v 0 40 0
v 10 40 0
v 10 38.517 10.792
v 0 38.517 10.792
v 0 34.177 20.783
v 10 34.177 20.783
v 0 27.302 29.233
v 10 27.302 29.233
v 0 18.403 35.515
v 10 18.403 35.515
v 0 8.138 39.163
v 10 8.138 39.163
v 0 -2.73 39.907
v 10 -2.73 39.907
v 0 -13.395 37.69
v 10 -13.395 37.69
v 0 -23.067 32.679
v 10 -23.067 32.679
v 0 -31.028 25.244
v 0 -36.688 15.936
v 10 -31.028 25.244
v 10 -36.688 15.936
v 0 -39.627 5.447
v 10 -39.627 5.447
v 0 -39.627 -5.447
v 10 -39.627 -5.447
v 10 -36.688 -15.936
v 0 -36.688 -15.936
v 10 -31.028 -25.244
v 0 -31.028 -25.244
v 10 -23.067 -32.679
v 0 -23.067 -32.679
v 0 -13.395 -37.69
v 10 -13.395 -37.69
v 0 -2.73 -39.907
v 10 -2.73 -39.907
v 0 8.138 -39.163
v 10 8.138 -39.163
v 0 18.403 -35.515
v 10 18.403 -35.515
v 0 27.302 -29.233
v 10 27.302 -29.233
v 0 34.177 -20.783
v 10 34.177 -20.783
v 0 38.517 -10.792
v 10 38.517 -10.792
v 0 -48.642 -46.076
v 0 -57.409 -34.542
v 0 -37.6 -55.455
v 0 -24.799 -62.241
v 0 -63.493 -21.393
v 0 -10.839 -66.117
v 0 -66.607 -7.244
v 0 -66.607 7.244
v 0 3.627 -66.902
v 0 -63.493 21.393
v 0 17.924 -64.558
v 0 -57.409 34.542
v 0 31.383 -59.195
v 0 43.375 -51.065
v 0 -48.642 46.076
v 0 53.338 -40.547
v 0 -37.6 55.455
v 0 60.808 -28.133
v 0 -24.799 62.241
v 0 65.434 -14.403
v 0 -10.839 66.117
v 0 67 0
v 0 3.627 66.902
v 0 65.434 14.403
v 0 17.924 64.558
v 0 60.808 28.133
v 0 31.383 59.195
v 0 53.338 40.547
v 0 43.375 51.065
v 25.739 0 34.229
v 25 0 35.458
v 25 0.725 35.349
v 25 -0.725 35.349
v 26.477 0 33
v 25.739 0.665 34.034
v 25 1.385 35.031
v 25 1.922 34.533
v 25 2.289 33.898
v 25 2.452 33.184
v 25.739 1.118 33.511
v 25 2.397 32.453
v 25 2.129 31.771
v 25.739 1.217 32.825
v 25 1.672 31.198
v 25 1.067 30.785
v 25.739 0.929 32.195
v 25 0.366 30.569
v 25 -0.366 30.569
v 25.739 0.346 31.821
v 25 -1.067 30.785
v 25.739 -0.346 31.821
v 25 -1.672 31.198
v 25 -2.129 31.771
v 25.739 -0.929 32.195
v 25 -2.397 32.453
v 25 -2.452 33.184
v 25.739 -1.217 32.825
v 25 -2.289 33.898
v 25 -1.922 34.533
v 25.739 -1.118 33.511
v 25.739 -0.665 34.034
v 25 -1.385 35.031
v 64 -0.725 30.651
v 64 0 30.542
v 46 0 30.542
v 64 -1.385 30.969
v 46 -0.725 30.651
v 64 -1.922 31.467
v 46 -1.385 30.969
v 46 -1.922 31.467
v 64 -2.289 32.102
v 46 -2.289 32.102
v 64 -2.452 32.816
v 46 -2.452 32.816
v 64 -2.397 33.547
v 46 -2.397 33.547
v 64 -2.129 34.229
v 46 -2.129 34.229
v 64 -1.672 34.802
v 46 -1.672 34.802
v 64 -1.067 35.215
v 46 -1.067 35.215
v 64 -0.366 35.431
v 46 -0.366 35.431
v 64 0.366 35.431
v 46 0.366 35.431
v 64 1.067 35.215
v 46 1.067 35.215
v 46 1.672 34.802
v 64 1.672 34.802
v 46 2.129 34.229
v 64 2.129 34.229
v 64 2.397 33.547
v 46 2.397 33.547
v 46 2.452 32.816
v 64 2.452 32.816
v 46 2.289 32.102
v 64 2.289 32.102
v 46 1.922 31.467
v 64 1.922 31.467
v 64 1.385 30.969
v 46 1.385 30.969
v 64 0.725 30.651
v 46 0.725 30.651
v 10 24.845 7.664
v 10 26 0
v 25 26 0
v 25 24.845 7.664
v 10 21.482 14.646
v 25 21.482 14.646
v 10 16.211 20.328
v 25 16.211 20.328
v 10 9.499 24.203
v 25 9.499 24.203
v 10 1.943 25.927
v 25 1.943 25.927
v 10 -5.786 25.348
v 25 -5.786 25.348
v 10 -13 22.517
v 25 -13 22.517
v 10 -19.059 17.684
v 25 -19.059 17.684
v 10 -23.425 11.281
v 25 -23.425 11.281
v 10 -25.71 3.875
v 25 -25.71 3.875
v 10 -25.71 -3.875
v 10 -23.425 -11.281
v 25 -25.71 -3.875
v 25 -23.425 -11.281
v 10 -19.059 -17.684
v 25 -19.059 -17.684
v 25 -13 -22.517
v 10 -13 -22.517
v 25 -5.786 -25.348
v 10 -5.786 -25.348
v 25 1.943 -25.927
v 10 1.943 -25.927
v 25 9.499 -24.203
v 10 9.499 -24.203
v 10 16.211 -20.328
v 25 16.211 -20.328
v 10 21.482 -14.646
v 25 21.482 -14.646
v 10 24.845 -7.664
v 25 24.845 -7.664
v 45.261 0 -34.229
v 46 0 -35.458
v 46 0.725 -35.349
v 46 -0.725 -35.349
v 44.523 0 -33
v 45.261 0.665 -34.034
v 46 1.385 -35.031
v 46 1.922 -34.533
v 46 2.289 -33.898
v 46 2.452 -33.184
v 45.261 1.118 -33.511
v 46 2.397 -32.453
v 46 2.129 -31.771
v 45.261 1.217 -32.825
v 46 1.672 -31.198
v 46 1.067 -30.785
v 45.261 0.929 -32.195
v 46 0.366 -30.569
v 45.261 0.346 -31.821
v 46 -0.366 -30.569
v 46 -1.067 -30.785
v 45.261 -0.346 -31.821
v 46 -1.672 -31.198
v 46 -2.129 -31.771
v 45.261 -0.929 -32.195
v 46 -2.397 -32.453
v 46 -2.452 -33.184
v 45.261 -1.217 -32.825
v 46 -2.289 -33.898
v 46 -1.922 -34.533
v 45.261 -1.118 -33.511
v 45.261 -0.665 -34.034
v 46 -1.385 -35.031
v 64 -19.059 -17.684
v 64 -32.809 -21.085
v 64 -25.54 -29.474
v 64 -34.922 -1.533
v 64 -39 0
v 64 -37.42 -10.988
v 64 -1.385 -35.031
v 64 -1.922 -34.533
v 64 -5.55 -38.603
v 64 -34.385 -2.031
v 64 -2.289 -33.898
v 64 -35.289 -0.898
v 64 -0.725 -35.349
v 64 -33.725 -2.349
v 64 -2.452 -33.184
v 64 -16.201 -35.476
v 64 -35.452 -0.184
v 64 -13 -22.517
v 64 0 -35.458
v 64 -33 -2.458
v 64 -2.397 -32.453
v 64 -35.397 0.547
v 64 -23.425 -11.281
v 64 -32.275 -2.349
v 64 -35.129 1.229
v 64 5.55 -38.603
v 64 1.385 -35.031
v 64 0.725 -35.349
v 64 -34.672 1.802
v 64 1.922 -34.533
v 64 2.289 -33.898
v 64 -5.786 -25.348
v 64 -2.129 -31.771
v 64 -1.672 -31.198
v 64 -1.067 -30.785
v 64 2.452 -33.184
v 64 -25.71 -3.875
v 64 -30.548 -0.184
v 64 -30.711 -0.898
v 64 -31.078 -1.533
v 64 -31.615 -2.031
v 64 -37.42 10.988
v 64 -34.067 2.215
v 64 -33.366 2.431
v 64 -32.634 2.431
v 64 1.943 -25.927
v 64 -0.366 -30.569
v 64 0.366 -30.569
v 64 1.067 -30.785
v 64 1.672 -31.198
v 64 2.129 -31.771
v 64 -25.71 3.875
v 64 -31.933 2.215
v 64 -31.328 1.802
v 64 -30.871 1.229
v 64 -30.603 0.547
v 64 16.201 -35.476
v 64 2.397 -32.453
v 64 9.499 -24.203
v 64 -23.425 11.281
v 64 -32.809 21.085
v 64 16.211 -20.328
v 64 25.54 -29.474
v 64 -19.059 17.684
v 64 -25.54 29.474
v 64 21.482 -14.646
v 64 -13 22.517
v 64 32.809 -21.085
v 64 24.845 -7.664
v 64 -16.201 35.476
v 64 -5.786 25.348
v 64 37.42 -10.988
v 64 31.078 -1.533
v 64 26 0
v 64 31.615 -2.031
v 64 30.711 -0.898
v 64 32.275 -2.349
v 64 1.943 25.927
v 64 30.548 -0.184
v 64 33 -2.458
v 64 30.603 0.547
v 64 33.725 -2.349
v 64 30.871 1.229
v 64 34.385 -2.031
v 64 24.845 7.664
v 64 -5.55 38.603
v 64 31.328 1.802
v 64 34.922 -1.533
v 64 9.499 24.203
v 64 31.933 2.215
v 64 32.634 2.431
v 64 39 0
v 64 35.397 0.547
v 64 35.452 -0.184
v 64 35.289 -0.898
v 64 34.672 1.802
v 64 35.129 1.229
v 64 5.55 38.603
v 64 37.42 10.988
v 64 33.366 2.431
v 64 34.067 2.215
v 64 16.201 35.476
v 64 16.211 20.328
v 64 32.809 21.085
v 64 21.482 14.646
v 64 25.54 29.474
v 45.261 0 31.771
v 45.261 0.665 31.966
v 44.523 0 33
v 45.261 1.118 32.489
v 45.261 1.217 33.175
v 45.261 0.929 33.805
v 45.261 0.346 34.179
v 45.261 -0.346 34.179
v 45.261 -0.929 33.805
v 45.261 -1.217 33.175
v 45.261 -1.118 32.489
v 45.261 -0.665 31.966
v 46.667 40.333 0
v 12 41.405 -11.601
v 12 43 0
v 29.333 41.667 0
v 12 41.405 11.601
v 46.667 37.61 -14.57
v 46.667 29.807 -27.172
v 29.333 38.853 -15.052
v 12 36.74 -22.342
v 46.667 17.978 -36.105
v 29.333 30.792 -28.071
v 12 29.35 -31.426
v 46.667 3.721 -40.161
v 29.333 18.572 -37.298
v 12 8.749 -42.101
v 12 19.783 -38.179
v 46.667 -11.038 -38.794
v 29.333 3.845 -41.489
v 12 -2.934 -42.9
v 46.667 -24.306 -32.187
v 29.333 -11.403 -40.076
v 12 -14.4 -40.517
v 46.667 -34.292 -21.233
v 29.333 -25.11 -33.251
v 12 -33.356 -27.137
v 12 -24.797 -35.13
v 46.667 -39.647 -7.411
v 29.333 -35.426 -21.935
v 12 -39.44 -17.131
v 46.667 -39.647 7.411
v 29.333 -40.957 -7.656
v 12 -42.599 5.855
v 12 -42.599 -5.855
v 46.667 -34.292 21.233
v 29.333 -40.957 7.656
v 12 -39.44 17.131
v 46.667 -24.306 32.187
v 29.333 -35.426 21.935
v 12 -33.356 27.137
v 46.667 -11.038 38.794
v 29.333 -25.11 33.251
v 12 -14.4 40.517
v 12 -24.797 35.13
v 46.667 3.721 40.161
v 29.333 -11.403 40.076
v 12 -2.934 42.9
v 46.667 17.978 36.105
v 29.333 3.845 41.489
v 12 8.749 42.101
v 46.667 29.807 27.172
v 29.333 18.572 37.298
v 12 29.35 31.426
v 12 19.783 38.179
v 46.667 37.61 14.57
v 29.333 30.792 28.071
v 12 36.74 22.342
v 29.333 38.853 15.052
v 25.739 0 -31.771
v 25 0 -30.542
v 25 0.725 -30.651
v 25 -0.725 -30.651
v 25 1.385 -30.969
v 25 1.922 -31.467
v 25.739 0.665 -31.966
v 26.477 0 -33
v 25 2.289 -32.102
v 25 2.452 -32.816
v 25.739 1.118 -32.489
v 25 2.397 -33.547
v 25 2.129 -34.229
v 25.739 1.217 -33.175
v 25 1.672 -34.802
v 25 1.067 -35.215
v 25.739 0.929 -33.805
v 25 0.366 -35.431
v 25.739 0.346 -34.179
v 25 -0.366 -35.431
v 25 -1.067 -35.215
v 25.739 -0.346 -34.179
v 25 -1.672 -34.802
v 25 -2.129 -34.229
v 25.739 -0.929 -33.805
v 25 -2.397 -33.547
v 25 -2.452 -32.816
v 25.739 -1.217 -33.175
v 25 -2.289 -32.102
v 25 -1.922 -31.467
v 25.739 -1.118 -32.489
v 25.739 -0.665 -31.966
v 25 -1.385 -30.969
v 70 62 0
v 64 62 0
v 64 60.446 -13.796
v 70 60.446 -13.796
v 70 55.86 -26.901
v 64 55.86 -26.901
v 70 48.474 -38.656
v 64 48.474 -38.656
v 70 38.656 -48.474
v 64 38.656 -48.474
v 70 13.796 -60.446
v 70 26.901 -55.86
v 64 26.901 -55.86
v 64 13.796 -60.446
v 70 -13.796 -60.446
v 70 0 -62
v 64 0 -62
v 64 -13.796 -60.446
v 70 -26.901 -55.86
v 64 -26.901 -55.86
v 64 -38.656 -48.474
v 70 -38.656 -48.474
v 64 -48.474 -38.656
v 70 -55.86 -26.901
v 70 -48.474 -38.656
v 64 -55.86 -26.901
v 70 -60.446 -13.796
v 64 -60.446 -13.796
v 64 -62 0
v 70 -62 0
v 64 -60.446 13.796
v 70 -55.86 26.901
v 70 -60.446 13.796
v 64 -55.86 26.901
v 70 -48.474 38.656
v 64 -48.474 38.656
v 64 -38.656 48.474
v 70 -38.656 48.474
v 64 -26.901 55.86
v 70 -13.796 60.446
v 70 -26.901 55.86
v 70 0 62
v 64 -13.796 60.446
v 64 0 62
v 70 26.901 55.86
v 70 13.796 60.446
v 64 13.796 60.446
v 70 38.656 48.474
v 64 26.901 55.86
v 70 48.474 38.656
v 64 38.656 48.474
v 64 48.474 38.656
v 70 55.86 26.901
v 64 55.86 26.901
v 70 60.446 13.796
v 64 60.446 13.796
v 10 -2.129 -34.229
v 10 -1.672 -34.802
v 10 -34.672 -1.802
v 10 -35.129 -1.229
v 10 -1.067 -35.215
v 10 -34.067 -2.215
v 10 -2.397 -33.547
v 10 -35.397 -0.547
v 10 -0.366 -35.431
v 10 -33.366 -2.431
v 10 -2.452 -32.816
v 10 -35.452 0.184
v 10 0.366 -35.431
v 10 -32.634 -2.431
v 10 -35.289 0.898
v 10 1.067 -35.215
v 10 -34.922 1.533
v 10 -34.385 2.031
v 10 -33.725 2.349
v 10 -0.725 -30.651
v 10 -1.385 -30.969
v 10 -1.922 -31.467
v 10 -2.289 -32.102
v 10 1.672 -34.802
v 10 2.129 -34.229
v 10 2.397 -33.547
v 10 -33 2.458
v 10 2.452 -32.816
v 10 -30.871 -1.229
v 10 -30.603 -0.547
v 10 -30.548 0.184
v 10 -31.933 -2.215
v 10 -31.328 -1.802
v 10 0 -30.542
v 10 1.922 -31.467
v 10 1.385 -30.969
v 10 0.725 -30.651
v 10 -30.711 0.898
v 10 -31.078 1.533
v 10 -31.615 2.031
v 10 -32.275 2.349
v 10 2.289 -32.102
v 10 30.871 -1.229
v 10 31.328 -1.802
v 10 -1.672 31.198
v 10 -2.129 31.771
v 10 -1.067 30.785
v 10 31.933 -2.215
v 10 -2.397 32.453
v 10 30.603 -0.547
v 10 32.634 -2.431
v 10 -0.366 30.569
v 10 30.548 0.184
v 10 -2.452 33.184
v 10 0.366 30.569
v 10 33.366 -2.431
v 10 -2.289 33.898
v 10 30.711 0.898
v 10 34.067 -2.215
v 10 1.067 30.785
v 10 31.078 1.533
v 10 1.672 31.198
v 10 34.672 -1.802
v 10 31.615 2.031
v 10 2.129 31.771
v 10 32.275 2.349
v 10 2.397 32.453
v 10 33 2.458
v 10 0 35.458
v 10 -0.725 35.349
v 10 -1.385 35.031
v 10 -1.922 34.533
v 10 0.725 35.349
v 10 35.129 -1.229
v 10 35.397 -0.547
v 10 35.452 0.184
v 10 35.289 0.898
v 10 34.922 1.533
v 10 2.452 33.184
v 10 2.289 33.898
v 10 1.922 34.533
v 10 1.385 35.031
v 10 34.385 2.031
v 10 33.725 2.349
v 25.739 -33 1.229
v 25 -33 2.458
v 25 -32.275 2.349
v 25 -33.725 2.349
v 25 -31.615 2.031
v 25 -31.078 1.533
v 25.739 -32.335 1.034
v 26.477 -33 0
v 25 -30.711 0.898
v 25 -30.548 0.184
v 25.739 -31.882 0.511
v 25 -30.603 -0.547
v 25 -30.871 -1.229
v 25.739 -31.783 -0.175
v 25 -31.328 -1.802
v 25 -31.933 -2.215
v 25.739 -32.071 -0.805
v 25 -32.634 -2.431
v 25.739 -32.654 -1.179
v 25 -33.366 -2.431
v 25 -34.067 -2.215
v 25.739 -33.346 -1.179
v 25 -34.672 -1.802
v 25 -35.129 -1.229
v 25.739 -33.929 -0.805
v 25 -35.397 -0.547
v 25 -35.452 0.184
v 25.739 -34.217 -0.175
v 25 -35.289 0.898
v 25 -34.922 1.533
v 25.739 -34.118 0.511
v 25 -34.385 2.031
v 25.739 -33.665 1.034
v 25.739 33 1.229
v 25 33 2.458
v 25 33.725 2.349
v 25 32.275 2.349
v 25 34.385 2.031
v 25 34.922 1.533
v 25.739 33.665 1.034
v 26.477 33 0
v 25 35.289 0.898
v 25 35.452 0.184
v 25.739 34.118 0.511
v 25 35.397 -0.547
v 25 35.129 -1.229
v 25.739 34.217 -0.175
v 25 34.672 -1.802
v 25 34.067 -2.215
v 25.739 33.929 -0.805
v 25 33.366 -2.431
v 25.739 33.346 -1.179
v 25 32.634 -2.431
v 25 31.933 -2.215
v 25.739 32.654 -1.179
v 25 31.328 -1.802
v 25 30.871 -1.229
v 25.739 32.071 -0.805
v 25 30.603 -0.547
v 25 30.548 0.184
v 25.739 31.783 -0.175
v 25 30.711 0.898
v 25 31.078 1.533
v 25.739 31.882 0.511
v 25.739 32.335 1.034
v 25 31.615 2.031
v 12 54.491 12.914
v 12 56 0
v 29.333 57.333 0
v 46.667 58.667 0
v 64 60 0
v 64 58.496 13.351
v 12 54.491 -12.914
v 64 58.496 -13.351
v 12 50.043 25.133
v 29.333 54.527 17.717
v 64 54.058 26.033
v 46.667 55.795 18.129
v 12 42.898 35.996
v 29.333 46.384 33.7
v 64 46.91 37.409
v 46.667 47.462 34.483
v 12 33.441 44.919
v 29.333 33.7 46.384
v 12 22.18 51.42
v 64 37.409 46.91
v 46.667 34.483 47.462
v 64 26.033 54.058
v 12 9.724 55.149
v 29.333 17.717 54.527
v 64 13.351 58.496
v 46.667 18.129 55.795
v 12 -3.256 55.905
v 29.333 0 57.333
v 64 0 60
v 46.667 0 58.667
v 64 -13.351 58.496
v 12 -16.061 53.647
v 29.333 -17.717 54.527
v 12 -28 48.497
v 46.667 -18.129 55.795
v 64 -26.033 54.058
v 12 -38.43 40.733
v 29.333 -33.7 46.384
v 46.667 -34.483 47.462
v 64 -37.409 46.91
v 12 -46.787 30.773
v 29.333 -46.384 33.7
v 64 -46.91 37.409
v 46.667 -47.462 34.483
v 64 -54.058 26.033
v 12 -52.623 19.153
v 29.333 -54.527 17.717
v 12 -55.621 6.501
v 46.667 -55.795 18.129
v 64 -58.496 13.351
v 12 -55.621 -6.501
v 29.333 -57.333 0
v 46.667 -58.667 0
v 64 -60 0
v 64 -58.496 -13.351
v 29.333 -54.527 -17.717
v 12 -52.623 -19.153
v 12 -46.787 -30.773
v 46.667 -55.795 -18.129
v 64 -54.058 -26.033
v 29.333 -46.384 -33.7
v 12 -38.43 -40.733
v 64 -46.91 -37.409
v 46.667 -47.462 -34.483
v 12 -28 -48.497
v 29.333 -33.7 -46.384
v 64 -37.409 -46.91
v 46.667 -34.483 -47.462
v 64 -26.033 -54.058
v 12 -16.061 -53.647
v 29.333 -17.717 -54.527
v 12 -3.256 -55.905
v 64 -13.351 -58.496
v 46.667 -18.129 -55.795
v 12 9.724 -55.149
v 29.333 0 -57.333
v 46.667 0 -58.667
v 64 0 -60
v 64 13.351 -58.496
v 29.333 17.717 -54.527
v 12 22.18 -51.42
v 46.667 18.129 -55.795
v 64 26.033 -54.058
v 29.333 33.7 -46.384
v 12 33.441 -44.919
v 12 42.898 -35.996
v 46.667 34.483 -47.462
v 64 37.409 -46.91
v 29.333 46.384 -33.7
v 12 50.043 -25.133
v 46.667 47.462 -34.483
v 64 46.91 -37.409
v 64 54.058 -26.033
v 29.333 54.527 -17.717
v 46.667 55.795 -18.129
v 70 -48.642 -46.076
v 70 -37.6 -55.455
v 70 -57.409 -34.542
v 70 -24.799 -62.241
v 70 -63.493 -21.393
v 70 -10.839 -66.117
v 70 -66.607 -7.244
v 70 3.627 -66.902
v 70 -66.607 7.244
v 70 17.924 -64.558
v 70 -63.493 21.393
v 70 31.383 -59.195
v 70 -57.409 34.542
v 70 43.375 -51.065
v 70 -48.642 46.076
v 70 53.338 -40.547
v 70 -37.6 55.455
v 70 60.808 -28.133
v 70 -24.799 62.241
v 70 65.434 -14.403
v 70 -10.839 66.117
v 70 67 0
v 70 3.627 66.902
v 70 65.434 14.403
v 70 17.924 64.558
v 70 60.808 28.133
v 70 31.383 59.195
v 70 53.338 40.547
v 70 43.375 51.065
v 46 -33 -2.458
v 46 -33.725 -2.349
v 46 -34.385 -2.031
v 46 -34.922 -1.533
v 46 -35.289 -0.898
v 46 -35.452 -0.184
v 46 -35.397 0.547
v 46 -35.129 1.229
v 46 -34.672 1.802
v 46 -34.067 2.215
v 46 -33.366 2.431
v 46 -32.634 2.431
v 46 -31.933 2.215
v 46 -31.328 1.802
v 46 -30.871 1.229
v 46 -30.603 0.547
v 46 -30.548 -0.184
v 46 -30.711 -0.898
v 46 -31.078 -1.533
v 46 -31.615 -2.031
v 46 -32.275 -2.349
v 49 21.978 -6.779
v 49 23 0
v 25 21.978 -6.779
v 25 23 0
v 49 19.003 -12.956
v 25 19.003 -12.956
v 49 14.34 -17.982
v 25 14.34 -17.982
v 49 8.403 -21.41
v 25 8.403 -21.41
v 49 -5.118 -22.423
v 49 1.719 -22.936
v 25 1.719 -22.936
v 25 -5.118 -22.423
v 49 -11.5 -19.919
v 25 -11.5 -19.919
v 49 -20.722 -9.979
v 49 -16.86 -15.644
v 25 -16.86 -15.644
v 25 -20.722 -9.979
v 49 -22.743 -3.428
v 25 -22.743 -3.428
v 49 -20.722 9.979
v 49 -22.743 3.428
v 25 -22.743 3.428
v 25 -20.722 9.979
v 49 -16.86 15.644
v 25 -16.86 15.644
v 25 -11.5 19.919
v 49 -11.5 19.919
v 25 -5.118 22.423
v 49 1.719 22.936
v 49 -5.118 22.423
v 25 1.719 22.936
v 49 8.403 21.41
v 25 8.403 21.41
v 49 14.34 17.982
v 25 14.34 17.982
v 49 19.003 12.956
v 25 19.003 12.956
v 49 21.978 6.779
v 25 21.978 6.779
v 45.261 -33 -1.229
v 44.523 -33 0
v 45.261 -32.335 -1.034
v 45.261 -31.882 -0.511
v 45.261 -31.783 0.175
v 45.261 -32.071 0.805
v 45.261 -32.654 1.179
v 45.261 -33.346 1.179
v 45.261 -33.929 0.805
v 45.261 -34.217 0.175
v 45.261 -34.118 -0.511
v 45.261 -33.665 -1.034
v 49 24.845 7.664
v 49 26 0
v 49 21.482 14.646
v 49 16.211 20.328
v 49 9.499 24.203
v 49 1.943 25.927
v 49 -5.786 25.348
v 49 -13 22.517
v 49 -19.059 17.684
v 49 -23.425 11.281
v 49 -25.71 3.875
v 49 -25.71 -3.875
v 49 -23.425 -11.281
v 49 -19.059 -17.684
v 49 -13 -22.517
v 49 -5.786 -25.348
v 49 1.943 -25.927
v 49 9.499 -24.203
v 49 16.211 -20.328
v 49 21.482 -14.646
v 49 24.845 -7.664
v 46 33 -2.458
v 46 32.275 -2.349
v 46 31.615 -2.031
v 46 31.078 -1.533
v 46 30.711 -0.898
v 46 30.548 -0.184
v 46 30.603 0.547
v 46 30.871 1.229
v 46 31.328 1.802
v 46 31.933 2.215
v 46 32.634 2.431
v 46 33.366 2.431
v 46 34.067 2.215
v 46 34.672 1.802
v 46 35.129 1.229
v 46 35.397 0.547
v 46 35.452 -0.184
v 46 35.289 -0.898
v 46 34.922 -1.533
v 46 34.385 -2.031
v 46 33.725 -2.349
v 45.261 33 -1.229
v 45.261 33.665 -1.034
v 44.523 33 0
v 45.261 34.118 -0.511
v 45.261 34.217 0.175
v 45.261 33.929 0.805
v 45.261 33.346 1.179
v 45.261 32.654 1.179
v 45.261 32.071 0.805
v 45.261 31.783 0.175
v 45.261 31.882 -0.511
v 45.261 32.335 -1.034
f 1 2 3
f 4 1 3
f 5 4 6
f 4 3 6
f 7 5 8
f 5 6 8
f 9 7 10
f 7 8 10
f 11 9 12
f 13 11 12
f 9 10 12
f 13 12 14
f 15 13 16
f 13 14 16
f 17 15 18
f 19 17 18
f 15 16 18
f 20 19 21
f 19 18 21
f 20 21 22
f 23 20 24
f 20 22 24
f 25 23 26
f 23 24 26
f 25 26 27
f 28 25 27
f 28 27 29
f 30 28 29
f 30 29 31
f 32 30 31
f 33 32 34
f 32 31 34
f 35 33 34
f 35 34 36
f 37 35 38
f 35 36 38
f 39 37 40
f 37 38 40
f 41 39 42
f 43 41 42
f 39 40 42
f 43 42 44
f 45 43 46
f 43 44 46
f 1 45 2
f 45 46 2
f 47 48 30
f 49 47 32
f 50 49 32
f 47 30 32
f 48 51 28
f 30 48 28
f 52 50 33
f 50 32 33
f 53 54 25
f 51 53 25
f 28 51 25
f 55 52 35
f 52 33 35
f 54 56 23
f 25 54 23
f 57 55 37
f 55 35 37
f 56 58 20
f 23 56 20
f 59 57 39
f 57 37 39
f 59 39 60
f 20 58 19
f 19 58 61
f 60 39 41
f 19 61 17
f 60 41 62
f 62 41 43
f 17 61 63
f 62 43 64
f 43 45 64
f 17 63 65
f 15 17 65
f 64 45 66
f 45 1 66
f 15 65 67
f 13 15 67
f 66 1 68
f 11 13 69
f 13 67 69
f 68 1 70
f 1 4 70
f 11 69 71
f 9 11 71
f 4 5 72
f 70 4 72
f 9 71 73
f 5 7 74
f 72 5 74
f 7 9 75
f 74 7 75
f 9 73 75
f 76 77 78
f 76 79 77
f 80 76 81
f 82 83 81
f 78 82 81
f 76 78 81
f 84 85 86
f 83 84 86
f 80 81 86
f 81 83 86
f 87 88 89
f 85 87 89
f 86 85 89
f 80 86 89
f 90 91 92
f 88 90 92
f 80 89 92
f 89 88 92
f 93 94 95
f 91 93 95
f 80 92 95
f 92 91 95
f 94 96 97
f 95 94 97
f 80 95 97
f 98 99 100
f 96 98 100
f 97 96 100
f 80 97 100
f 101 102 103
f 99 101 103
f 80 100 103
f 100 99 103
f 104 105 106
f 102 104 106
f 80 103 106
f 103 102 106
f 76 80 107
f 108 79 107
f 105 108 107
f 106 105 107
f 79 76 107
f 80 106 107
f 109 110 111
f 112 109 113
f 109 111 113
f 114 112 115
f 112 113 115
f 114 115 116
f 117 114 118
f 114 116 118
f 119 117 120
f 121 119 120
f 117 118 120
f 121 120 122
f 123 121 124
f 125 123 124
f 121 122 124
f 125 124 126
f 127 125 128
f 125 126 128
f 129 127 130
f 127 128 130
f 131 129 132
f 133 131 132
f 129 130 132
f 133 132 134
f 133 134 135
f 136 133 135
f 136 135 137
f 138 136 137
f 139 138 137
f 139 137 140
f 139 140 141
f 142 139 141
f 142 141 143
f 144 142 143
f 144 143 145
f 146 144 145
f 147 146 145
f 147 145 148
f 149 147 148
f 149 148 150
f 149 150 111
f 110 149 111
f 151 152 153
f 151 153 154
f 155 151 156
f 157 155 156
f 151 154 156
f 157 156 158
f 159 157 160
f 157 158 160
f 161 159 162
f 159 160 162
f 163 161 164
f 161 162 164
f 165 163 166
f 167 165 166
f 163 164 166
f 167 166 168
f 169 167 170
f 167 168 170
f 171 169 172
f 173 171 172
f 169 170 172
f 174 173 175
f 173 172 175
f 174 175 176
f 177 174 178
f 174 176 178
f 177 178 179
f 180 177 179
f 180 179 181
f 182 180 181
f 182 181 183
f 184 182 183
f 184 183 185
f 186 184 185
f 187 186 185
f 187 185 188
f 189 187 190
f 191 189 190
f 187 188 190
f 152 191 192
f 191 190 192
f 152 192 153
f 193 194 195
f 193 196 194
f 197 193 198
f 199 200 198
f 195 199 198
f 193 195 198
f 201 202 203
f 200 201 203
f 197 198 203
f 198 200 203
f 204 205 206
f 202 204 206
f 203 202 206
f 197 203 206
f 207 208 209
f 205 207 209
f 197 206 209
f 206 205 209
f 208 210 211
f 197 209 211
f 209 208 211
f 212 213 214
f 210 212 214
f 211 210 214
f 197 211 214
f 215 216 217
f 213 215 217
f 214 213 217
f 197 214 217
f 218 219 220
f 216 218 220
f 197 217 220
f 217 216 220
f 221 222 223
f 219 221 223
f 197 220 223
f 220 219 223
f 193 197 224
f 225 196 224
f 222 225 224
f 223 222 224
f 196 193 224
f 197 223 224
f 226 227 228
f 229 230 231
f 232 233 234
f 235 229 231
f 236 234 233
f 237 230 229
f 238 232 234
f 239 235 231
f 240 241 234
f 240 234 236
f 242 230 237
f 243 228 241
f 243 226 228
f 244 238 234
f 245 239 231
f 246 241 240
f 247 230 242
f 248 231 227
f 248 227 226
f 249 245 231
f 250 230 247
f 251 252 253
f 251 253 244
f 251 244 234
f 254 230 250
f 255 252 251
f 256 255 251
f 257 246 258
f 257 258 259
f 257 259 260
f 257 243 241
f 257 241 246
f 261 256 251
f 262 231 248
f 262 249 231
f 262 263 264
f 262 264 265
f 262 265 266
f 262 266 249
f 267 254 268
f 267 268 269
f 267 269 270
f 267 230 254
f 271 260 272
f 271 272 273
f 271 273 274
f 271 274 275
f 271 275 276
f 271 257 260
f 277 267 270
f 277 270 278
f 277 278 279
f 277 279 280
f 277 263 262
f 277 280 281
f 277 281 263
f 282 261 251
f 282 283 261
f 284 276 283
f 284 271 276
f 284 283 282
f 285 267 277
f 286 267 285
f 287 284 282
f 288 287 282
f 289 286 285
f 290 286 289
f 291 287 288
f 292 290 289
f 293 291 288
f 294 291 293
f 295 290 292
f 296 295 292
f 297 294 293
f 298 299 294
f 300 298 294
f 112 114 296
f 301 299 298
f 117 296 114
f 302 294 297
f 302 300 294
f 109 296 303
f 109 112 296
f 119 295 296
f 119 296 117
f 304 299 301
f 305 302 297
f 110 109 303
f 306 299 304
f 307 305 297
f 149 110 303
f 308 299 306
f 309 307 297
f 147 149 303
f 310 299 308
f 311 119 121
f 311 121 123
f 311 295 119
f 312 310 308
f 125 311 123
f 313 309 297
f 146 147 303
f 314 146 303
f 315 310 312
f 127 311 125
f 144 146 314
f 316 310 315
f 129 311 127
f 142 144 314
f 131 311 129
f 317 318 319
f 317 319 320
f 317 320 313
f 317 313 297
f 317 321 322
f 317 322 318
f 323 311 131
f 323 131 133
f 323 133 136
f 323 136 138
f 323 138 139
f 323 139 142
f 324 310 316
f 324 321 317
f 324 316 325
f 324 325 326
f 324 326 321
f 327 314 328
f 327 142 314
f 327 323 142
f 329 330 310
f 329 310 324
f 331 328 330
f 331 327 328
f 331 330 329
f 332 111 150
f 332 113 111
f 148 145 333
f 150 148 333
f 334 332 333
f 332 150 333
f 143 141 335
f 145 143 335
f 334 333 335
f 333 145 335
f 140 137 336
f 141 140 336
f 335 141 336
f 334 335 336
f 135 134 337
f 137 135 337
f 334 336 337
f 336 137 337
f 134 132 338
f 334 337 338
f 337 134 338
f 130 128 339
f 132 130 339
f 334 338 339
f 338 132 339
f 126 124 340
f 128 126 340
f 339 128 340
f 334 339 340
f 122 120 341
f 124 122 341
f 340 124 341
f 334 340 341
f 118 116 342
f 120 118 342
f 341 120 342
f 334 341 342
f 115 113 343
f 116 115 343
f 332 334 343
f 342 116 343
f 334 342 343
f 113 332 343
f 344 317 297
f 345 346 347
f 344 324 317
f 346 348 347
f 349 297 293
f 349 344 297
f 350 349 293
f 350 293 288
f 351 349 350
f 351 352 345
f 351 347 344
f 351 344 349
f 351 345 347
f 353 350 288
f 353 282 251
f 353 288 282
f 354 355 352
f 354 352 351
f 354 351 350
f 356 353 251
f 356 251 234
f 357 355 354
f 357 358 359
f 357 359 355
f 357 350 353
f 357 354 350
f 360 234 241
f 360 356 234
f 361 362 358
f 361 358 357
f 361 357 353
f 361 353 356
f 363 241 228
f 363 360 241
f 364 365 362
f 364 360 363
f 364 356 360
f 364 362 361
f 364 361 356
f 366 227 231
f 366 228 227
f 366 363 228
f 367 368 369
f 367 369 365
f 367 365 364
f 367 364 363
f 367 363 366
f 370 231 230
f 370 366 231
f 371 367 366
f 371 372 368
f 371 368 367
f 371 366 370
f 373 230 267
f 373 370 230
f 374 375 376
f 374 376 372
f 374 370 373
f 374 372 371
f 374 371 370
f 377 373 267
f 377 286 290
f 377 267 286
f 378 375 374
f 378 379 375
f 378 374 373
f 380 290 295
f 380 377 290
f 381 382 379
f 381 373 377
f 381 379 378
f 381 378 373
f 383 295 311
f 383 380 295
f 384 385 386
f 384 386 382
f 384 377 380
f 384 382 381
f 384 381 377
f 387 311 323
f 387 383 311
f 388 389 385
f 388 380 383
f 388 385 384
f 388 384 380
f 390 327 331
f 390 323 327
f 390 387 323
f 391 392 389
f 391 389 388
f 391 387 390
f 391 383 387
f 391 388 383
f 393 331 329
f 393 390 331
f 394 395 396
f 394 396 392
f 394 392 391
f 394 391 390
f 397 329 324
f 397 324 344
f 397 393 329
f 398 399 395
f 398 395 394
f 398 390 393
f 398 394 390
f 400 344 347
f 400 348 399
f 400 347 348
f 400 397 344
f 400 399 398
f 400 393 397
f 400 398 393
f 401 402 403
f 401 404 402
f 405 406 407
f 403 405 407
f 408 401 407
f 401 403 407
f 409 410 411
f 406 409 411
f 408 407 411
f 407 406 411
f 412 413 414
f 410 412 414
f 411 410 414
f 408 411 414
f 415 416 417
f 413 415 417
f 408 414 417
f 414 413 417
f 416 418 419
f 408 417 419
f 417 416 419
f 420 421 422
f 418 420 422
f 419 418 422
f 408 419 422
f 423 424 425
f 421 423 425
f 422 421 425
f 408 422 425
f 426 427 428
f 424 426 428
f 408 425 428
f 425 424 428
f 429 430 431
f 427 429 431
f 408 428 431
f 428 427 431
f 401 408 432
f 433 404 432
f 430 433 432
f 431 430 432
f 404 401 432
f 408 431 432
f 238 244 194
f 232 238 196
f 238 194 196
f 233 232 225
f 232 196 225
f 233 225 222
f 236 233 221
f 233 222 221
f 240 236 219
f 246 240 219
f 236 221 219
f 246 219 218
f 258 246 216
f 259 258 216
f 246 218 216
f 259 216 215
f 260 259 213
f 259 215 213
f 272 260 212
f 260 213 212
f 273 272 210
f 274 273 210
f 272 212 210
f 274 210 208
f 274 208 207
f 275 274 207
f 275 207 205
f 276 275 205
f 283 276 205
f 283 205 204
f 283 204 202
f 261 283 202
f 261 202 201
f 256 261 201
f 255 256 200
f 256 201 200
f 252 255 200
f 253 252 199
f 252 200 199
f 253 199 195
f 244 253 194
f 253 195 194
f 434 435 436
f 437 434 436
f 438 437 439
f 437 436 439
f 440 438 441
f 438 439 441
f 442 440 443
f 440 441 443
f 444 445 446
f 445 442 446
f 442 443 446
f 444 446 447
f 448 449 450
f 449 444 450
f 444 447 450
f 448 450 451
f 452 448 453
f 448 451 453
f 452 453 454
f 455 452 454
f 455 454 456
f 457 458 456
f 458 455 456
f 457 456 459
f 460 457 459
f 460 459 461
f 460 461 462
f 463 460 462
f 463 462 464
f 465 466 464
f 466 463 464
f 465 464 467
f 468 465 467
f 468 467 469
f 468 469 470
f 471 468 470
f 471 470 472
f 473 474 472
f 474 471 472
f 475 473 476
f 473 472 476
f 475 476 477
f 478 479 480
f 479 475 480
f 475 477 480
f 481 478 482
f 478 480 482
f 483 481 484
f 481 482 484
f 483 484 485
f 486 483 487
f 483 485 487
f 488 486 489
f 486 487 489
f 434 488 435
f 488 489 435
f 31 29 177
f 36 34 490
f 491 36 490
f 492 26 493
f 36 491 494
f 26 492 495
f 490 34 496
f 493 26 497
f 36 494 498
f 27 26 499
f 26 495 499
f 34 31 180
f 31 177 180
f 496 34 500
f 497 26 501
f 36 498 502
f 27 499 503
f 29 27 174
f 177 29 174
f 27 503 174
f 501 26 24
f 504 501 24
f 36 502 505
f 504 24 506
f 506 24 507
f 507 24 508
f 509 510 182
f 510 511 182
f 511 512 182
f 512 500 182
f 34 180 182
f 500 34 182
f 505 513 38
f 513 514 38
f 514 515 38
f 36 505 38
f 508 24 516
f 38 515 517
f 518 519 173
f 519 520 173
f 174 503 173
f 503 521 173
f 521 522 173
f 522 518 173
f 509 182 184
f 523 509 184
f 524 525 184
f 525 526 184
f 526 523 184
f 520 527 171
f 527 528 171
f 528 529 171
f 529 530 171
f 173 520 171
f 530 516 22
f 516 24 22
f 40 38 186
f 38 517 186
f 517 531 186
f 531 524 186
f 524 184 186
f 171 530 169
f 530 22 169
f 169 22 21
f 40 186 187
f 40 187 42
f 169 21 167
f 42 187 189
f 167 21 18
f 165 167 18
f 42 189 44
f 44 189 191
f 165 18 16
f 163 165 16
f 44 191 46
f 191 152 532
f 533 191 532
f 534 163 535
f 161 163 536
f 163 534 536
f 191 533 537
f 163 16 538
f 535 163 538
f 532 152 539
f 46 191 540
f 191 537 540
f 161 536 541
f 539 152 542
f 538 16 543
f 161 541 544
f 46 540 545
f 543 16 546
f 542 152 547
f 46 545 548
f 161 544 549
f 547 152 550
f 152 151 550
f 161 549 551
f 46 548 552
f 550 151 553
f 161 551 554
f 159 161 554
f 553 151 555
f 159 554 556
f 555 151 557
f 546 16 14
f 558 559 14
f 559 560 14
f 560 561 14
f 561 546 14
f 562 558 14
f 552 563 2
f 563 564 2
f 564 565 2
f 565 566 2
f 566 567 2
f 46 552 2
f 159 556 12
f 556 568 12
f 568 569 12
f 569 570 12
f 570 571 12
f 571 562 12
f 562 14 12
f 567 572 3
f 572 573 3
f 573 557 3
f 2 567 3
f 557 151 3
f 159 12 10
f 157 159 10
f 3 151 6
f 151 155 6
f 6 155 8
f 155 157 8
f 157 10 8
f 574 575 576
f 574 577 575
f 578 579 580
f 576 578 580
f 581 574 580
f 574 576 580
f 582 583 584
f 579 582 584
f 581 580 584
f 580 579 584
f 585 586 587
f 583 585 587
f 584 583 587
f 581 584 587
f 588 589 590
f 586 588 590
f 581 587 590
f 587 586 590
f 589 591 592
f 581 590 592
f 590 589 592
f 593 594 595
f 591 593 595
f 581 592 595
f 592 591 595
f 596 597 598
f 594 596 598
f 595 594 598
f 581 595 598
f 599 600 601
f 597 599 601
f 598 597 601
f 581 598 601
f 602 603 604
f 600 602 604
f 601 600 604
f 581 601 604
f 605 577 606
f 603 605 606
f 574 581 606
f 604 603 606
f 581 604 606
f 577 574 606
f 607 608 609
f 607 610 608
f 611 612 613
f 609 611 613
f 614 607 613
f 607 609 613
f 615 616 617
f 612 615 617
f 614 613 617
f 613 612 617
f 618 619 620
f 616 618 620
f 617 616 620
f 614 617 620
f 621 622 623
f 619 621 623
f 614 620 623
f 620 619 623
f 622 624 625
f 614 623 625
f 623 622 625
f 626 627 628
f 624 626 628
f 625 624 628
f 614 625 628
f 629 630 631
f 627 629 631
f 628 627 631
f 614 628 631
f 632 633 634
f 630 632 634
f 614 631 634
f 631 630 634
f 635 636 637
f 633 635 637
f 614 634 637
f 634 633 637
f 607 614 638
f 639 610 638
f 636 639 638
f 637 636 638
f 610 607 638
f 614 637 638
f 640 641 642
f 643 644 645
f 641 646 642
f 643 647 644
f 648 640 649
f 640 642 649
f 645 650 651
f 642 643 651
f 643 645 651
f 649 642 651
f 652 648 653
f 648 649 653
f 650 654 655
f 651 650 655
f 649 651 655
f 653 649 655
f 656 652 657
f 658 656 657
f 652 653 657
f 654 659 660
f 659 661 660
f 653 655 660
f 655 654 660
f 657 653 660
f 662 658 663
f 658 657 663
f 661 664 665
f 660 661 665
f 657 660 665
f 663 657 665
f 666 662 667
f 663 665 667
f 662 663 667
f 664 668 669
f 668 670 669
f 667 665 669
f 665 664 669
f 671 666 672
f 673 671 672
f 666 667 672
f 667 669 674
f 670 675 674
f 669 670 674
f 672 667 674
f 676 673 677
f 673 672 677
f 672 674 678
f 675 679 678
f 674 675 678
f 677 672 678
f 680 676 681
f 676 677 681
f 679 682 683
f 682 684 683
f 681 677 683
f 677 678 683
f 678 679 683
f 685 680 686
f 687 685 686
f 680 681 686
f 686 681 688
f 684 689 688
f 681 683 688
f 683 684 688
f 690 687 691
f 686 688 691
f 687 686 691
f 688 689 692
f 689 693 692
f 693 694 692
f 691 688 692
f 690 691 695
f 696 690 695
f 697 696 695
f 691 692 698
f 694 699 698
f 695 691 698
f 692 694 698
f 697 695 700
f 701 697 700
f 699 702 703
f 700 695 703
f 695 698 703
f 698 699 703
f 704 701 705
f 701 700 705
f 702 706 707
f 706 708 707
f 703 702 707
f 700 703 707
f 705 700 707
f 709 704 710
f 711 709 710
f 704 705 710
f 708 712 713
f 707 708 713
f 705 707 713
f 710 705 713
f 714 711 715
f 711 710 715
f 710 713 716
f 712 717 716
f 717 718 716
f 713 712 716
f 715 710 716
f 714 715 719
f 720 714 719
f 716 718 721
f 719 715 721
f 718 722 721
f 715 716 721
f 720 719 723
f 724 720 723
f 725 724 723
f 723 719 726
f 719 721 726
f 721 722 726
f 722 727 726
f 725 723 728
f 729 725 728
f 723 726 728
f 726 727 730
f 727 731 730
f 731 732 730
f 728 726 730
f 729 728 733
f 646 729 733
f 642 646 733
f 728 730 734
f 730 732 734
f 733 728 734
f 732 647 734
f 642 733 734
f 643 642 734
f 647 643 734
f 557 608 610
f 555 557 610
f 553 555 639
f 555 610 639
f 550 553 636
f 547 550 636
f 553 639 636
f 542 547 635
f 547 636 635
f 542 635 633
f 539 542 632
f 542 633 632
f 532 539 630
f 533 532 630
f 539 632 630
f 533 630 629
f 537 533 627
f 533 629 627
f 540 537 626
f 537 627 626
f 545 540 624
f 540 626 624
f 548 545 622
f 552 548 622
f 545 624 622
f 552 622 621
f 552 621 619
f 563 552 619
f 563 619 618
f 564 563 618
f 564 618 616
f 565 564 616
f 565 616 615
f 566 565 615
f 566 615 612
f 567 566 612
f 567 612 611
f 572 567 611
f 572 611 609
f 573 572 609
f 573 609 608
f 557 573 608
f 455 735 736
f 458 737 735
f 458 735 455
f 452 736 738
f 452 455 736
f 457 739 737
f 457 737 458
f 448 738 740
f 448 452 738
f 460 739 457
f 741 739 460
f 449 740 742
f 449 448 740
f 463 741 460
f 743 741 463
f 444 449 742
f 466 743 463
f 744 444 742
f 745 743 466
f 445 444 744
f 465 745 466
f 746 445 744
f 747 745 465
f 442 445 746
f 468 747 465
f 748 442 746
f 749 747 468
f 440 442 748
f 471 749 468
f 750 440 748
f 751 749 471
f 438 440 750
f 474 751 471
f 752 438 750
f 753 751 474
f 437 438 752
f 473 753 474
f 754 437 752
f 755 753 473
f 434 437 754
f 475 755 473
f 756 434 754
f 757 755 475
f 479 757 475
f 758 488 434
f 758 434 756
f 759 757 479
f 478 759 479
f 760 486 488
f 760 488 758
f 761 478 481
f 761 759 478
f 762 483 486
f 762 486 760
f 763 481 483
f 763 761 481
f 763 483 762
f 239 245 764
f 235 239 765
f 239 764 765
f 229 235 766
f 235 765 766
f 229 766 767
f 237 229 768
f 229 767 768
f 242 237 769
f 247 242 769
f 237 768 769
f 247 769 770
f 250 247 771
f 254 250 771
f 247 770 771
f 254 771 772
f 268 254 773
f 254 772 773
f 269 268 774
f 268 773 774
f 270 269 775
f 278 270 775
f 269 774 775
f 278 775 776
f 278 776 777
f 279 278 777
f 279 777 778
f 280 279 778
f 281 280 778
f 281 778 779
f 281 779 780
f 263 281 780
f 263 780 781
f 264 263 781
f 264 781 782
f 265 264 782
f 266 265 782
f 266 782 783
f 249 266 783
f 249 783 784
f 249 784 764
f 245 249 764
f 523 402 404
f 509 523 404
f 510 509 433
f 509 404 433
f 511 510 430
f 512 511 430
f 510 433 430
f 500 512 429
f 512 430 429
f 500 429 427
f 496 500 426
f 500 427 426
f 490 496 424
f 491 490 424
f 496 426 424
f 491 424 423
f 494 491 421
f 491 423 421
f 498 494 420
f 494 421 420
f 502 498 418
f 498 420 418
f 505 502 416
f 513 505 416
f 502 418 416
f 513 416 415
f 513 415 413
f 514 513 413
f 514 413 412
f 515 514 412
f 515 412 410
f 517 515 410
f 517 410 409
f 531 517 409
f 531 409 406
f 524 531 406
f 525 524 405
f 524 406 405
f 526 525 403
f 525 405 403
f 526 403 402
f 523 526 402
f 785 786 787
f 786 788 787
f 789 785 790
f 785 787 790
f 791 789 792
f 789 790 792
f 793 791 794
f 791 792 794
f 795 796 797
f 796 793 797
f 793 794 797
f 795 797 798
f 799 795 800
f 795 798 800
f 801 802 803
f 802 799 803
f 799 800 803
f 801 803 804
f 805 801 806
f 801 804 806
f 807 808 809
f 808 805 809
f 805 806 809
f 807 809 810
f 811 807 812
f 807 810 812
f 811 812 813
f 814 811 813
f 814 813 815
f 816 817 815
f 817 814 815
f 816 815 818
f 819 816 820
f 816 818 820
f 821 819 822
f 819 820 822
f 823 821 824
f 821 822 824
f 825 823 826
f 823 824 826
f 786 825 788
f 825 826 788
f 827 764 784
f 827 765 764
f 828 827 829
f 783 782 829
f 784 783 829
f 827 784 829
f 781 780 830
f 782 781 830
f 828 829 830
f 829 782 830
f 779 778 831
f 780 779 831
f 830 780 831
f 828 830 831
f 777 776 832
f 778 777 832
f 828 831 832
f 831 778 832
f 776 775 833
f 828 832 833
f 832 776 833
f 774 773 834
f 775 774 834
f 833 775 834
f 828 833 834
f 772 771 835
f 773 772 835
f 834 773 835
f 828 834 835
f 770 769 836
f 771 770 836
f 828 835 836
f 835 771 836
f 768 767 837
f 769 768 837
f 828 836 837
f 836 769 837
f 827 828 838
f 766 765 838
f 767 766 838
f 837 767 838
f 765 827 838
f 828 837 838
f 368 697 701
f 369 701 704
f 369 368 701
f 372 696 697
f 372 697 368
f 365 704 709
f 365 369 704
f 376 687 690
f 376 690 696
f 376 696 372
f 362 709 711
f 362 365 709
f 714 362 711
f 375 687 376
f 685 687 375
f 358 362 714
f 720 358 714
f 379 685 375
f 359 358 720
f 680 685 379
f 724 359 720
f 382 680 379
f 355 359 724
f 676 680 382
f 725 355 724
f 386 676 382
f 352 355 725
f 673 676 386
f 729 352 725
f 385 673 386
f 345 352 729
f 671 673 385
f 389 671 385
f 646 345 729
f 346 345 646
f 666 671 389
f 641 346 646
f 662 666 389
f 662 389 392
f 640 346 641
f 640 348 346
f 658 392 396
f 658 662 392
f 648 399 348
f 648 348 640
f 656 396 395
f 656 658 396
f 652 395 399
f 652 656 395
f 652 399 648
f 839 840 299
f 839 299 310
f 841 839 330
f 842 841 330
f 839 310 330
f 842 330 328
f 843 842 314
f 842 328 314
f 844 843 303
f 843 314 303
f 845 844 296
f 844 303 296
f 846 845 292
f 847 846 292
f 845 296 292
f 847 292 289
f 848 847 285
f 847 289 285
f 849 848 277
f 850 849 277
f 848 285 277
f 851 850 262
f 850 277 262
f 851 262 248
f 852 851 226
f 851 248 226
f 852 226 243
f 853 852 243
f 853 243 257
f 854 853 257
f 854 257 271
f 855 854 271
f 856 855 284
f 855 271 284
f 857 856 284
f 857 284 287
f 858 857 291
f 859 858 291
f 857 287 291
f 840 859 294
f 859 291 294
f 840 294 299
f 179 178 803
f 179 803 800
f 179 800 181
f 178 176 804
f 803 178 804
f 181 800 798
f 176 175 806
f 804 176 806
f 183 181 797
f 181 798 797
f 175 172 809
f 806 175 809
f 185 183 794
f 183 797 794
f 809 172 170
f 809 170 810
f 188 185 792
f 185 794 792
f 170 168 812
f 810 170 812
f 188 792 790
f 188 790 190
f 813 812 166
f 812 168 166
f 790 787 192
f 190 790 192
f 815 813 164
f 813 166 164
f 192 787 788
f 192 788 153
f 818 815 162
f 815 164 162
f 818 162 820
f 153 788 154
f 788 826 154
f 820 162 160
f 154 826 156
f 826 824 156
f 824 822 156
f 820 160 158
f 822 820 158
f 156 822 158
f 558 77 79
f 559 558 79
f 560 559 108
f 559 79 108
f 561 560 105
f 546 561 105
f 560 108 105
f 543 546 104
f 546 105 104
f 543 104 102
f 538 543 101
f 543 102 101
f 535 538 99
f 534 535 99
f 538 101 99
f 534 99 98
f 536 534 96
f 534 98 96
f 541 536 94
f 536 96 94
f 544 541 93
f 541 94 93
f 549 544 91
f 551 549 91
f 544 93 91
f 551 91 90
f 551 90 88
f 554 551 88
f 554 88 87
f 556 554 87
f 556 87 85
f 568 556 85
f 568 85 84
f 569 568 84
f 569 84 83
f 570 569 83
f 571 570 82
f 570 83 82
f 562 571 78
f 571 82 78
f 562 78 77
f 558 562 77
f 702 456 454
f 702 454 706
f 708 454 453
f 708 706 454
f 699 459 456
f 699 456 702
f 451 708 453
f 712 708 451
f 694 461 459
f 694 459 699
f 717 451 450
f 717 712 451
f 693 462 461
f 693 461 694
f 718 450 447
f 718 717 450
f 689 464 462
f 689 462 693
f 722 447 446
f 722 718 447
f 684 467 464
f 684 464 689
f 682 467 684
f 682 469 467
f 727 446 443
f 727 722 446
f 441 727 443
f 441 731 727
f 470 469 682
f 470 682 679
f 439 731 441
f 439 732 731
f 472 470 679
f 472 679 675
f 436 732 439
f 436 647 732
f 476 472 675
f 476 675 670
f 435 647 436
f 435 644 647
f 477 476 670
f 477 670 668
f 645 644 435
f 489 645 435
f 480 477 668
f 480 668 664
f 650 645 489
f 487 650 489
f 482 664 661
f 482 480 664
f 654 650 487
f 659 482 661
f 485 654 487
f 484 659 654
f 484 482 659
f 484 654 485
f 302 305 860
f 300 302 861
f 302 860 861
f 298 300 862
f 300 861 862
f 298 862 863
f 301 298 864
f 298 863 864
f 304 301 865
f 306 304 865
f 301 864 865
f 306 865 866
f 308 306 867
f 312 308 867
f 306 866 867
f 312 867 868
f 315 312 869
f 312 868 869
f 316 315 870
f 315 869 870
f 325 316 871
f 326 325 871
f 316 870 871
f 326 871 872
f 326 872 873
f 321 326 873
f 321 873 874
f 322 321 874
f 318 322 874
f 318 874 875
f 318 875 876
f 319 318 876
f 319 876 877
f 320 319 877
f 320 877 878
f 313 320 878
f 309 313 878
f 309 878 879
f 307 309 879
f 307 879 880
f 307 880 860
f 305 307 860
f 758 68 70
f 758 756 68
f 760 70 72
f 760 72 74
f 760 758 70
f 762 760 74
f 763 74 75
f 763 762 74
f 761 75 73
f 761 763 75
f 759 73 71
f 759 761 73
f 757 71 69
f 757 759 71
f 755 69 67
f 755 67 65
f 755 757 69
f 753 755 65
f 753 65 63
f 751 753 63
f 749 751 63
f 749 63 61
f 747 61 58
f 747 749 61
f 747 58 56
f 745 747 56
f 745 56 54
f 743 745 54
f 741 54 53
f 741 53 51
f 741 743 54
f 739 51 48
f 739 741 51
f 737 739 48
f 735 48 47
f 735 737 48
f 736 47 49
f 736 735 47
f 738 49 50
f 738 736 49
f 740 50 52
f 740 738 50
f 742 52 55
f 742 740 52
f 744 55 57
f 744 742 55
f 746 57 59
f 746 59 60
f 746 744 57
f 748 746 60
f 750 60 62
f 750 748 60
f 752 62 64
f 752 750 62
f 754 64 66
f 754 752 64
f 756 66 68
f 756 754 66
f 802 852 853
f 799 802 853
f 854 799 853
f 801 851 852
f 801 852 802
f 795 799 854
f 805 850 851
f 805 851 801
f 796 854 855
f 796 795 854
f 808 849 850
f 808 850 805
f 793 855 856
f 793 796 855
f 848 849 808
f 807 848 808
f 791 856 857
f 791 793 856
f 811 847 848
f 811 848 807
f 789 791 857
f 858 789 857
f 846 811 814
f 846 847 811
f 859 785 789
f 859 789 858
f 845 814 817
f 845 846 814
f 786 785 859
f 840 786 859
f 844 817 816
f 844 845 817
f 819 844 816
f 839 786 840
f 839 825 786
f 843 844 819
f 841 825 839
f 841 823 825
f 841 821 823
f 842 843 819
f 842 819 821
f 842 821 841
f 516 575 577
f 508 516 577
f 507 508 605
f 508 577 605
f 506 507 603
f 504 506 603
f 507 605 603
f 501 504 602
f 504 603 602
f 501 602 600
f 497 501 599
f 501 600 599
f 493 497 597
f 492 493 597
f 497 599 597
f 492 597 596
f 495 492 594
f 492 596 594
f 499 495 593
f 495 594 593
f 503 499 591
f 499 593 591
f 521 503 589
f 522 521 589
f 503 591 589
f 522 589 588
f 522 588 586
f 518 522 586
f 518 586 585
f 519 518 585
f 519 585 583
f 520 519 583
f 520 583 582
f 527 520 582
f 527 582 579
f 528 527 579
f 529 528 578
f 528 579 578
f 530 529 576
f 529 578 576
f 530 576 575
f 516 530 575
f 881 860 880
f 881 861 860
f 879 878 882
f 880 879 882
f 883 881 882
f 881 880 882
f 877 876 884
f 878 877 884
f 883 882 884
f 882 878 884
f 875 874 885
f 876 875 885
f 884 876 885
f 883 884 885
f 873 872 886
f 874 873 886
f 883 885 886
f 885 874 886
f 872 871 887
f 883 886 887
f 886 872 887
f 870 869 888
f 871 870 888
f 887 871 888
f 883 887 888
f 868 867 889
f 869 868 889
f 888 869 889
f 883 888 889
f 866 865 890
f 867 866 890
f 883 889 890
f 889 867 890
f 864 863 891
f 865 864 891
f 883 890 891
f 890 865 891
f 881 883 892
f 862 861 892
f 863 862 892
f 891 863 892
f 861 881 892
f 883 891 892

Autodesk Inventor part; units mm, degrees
ref_plane "YZ Plane" through (0, 0, 0) normal (1, 0, 0) x (0, 1, 0)
ref_plane "XZ Plane" through (0, 0, 0) normal (0, 1, 0) x (-1, 0, 0)
ref_plane "XY Plane" through (0, 0, 0) normal (0, 0, 1) x (1, 0, 0)
sketch "Boceto1" plane through (0, 0, 0) normal (0, 0, 1) x (1, 0, 0)
  line L0 (0, 0) -> (0, 40)
  line L1 (0, 40) -> (10, 40)
  line L2 (0, 0) -> (80, 0)
  line L3 (10, 40) -> (10, 0)
  line L4 (10, 0) -> (10, 26)
  line L5 (10, 26) -> (25, 26)
  line L6 (25, 26) -> (25, 0)
  line L7 (25, 0) -> (25, 23)
  line L8 (0, 0) -> (0, 67)
  line L9 (0, 67) -> (70, 67)
  line L10 (0, 67) -> (12, 67) construction
  line L11 (12, 67) -> (12, 0) construction
  line L12 (70, 67) -> (70, 62)
  line L13 (70, 62) -> (64, 62)
  line L14 (70, 62) -> (70, 0)
  line L15 (64, 0) -> (70, 0)
  line L16 (64, 0) -> (70, 0)
  line L17 (64, 62) -> (64, 0)
  line L18 (64, 62) -> (64, 60)
  line L19 (64, 0) -> (64, 39)
  line L20 (64, 60) -> (116.3905, 60) construction
  line L21 (64, 39) -> (116.3905, 39) construction
  line L22 (25, 0) -> (25, 23)
  line L23 (49, 0) -> (49, 23)
  line L24 (49, 23) -> (25, 23)
  line L25 (49, 23) -> (49, 26)
  line L26 (49, 26) -> (64, 26)
  line L27 (64, 39) -> (64, 49.5)
  line L28 (64, 49.5) -> (-5.756, 49.5) construction
  line L29 (12, 49.5) -> (12, 56)
  line L30 (12, 56) -> (12, 43)
  line L31 (12, 56) -> (64, 60)
  line L32 (64, 39) -> (12, 43)
  dimension "d0" = 40
  dimension "d1" = 10
  dimension "d2" = 80
  dimension "d3" = 26
  dimension "d4" = 15
  dimension "d10" = 67
  dimension "d12" = 70
  dimension "d16" = 12
  dimension "d22" = 5
  dimension "d29" = 54
  dimension "d30" = 2
  dimension "d31" = 39
  dimension "d40" = 24
  dimension "d41" = 23
  dimension "d42" = 3
  dimension "d45" = 10.5
  dimension "d46" = 6.5
  dimension "d47" = 13
revolve "Revolución1" add sketch "Boceto1" angle 360 about axis through (0, 0, 0) along (1, 0, 0) contours L8 L9 L12 L13 L17 L31 L29 L30 L32 L26 L25 L24 L6 L5 L3 L1
sketch "Boceto4" plane through (10, 0, 0) normal (-1, 0, 0) x (0, 0, 1)
  circle A0 centre (0, 0) radius 33 construction
  circle A1 centre (0, 0) radius 33 construction
  circle A2 centre (0, 0) radius 33 construction
  circle A3 centre (0, 0) radius 33 construction
  point P0 (-33, 0)
  point P1 (0, -33)
  point P2 (33, 0)
  point P3 (0, 33)
  dimension "d61" = 66
  dimension "d64" = 360
hole "Agujero2" at (10, 33, 0) at (10, 0, 33) at (10, -33, 0) at (10, 0, -33) direction (1, 0, 0) diameter 4.917 depth 15 tip angle 118 thread size "M6x1" class "6H" standard "ANSI Metric M Profile"
sketch "Boceto5" plane through (64, 0, 0) normal (1, 0, 0) x (0, 0, -1)
  circle A0 centre (0, 0) radius 33 construction
  circle A1 centre (0, 33) radius 2.4585 projected
  circle A2 centre (-33, 0) radius 2.4585 projected
  circle A3 centre (33, 0) radius 2.4585 projected
  circle A4 centre (0, -33) radius 2.4585 projected
  dimension "d73" = 66
hole "Agujero3" at (64, 33, 0) at (64, 0, 33) at (64, 0, -33) at (64, -33, 0) direction (-1, 0, 0) diameter 4.917 depth 18 tip angle 118 thread size "M6x1" class "6H" standard "ANSI Metric M Profile"
properties part number "Cilindro Tensor"
